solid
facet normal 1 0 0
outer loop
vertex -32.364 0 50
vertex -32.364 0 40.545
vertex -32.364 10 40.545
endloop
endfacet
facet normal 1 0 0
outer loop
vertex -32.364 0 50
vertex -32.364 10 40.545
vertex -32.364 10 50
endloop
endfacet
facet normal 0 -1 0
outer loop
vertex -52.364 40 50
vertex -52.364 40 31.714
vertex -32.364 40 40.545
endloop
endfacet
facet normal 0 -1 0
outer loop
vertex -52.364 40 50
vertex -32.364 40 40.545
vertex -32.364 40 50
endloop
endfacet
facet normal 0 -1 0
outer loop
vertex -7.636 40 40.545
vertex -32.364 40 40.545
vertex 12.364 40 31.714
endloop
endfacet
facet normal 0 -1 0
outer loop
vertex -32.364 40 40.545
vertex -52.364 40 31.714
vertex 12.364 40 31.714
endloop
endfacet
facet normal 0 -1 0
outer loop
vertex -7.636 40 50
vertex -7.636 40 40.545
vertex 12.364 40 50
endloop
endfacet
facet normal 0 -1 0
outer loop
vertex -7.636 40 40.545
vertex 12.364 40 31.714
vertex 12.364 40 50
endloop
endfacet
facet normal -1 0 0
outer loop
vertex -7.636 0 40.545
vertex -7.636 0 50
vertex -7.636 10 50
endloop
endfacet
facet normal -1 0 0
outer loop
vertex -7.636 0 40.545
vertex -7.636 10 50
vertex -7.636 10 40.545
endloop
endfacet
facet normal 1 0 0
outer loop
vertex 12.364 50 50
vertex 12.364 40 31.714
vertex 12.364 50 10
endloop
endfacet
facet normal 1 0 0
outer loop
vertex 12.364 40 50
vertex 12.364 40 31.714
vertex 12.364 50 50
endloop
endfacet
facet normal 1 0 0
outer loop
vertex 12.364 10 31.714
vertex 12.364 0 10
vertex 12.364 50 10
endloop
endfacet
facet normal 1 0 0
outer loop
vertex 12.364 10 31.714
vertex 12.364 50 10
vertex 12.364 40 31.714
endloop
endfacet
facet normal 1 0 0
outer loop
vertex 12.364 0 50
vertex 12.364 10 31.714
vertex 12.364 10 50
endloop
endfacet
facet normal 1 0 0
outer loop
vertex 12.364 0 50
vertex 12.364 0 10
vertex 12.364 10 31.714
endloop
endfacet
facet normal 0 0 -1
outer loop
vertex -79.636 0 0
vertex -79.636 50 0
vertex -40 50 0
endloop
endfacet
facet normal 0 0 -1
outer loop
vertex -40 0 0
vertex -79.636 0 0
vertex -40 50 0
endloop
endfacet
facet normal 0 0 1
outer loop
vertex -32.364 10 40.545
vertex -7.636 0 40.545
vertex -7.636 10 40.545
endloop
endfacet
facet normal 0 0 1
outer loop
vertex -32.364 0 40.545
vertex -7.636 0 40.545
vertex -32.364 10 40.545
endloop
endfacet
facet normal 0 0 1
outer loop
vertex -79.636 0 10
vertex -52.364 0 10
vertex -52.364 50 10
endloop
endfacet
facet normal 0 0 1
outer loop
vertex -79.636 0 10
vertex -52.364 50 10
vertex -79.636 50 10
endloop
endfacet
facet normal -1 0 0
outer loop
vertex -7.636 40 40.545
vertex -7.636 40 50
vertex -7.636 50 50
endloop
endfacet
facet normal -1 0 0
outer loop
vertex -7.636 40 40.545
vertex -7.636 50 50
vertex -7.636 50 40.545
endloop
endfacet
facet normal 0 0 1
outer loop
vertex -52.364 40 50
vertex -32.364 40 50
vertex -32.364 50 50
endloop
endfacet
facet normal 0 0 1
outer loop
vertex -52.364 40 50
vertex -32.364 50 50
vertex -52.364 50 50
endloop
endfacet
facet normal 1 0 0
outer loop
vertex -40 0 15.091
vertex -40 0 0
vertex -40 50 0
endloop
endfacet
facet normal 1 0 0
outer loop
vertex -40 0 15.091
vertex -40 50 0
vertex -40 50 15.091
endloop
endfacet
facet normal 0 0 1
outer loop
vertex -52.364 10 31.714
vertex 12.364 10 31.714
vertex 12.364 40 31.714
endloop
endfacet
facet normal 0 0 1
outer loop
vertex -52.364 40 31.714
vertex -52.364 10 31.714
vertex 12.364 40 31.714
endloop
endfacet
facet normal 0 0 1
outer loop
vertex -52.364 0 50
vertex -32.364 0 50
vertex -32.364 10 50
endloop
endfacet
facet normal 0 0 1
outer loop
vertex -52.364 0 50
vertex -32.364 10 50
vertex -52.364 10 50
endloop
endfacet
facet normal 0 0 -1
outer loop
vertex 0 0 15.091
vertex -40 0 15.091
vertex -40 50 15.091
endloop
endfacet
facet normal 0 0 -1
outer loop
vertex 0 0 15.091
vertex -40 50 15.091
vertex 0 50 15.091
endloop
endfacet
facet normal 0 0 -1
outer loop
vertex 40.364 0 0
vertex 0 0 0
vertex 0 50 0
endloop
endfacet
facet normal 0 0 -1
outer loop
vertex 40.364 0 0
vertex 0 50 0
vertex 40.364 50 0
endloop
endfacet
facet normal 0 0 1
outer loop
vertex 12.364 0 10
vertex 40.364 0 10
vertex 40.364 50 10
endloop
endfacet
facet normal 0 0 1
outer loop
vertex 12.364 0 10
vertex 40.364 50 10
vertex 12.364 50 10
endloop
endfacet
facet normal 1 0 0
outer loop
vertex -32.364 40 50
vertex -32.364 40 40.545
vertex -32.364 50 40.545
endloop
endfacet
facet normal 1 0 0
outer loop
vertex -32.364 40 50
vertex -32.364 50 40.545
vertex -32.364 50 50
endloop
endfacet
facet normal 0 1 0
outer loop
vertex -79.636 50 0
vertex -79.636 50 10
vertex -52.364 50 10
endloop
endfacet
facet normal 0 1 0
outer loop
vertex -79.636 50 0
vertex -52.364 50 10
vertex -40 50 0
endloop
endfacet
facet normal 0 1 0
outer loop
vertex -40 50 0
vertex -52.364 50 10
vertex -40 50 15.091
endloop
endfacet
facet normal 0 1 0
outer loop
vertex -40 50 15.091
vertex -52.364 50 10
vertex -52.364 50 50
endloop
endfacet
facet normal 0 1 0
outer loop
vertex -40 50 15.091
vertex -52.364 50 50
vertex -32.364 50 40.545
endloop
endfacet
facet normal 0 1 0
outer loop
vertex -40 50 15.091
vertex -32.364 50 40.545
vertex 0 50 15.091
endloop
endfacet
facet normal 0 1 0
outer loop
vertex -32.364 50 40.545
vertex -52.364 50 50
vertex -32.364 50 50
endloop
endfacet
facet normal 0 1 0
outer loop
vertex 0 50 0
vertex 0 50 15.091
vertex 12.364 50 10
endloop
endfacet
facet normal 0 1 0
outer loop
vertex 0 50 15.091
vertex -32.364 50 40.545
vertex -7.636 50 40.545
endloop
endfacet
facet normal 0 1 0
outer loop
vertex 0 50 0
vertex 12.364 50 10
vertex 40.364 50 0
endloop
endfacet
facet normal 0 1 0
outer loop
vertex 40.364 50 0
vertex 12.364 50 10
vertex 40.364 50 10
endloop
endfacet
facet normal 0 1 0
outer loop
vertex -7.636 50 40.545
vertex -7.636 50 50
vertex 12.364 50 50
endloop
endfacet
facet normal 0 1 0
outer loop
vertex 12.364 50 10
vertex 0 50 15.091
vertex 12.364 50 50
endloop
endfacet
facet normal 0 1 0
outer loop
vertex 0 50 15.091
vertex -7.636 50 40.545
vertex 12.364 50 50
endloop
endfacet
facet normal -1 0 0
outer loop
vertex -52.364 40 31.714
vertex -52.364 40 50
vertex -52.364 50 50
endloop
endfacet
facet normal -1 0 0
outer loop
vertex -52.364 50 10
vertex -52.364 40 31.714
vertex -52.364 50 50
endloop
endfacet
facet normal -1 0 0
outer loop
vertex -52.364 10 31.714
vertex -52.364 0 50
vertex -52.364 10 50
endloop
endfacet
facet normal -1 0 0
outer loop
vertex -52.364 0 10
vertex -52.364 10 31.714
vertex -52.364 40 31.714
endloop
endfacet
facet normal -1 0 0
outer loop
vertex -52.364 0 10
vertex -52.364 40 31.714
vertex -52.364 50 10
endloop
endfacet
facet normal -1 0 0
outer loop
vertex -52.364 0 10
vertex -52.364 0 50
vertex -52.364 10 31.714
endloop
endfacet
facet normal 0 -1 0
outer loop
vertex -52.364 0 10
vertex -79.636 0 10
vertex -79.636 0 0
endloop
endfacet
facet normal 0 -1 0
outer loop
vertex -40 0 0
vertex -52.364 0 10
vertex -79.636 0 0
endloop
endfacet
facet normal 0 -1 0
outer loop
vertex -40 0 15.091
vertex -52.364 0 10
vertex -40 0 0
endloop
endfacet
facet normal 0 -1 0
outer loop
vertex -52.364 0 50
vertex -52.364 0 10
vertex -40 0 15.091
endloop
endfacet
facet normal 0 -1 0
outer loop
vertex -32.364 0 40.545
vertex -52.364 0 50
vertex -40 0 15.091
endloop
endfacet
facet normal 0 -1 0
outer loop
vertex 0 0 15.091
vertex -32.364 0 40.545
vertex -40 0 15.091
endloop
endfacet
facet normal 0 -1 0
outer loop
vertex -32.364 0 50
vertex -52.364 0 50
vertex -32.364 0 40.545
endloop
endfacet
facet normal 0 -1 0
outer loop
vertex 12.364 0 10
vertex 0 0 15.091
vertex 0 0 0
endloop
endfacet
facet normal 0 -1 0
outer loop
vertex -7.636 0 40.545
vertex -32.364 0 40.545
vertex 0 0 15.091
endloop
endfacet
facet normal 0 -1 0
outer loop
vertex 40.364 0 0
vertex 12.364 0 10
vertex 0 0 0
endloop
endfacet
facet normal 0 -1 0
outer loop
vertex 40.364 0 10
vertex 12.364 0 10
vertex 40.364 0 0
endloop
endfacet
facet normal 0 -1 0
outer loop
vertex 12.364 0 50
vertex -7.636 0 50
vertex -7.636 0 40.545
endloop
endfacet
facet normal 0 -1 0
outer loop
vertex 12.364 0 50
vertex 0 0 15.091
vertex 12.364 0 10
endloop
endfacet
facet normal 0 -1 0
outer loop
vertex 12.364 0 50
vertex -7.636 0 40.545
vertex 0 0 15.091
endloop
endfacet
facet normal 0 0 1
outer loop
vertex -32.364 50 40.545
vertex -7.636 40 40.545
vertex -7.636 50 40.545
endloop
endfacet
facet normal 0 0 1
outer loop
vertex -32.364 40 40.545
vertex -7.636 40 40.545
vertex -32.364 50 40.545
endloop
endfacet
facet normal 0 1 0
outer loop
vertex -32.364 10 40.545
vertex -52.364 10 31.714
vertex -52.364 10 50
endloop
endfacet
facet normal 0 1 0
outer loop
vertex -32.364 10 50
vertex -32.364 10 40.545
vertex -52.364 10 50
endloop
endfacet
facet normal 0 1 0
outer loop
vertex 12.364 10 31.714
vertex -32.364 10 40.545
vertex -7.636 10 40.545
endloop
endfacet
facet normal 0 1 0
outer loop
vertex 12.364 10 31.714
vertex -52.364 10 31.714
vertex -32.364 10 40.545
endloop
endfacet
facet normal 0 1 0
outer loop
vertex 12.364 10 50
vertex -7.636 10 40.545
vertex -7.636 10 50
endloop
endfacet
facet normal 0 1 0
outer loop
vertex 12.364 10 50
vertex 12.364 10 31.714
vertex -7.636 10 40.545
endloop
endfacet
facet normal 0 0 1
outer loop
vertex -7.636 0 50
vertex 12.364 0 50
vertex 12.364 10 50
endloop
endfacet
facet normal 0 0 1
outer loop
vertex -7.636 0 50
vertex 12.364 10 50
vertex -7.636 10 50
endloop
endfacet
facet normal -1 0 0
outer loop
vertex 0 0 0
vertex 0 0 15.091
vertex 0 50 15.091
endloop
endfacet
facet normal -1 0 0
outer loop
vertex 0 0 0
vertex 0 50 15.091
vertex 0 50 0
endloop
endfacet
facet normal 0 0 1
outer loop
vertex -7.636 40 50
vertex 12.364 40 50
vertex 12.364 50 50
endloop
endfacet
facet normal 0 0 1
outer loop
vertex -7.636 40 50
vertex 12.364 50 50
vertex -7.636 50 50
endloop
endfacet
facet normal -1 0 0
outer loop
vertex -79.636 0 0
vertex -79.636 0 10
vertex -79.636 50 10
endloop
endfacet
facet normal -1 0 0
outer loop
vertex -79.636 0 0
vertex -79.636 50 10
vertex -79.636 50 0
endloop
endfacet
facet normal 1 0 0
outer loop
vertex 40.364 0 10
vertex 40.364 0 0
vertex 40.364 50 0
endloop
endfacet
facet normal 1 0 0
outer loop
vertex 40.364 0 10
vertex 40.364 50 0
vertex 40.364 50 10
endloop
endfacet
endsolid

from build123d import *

# Parameters (mm, degrees)
F1_DEPTH = 50
F2_W     = 30
F2_H     = 18.285982
F3_DEPTH = 92.000995


with BuildPart() as f1:
    # F0 (on Front) → F1 (new body)
    with BuildSketch(Plane.XZ):
        Polygon((0, 15.090908), (0, 0), (40.363642, 0), (40.363642, 10), (12.363637, 10), (12.363637, 50), (-7.636363, 50), (-7.636363, 40.545456), (-32.363635, 40.545456), (-32.363635, 50), (-52.363635, 50), (-52.363635, 10), (-79.636358, 10), (-79.636358, 0), (-40, 0), (-40, 15.090908), align=None)
    extrude(amount=-F1_DEPTH)

    # F2 (on face) → F3 (cut, through all)
    with BuildSketch(Plane.YZ.offset(12.363637)):
        with Locations((25, 40.857009)):
            Rectangle(F2_W, F2_H)
    extrude(amount=-F3_DEPTH, mode=Mode.SUBTRACT)


solid = f1.part
